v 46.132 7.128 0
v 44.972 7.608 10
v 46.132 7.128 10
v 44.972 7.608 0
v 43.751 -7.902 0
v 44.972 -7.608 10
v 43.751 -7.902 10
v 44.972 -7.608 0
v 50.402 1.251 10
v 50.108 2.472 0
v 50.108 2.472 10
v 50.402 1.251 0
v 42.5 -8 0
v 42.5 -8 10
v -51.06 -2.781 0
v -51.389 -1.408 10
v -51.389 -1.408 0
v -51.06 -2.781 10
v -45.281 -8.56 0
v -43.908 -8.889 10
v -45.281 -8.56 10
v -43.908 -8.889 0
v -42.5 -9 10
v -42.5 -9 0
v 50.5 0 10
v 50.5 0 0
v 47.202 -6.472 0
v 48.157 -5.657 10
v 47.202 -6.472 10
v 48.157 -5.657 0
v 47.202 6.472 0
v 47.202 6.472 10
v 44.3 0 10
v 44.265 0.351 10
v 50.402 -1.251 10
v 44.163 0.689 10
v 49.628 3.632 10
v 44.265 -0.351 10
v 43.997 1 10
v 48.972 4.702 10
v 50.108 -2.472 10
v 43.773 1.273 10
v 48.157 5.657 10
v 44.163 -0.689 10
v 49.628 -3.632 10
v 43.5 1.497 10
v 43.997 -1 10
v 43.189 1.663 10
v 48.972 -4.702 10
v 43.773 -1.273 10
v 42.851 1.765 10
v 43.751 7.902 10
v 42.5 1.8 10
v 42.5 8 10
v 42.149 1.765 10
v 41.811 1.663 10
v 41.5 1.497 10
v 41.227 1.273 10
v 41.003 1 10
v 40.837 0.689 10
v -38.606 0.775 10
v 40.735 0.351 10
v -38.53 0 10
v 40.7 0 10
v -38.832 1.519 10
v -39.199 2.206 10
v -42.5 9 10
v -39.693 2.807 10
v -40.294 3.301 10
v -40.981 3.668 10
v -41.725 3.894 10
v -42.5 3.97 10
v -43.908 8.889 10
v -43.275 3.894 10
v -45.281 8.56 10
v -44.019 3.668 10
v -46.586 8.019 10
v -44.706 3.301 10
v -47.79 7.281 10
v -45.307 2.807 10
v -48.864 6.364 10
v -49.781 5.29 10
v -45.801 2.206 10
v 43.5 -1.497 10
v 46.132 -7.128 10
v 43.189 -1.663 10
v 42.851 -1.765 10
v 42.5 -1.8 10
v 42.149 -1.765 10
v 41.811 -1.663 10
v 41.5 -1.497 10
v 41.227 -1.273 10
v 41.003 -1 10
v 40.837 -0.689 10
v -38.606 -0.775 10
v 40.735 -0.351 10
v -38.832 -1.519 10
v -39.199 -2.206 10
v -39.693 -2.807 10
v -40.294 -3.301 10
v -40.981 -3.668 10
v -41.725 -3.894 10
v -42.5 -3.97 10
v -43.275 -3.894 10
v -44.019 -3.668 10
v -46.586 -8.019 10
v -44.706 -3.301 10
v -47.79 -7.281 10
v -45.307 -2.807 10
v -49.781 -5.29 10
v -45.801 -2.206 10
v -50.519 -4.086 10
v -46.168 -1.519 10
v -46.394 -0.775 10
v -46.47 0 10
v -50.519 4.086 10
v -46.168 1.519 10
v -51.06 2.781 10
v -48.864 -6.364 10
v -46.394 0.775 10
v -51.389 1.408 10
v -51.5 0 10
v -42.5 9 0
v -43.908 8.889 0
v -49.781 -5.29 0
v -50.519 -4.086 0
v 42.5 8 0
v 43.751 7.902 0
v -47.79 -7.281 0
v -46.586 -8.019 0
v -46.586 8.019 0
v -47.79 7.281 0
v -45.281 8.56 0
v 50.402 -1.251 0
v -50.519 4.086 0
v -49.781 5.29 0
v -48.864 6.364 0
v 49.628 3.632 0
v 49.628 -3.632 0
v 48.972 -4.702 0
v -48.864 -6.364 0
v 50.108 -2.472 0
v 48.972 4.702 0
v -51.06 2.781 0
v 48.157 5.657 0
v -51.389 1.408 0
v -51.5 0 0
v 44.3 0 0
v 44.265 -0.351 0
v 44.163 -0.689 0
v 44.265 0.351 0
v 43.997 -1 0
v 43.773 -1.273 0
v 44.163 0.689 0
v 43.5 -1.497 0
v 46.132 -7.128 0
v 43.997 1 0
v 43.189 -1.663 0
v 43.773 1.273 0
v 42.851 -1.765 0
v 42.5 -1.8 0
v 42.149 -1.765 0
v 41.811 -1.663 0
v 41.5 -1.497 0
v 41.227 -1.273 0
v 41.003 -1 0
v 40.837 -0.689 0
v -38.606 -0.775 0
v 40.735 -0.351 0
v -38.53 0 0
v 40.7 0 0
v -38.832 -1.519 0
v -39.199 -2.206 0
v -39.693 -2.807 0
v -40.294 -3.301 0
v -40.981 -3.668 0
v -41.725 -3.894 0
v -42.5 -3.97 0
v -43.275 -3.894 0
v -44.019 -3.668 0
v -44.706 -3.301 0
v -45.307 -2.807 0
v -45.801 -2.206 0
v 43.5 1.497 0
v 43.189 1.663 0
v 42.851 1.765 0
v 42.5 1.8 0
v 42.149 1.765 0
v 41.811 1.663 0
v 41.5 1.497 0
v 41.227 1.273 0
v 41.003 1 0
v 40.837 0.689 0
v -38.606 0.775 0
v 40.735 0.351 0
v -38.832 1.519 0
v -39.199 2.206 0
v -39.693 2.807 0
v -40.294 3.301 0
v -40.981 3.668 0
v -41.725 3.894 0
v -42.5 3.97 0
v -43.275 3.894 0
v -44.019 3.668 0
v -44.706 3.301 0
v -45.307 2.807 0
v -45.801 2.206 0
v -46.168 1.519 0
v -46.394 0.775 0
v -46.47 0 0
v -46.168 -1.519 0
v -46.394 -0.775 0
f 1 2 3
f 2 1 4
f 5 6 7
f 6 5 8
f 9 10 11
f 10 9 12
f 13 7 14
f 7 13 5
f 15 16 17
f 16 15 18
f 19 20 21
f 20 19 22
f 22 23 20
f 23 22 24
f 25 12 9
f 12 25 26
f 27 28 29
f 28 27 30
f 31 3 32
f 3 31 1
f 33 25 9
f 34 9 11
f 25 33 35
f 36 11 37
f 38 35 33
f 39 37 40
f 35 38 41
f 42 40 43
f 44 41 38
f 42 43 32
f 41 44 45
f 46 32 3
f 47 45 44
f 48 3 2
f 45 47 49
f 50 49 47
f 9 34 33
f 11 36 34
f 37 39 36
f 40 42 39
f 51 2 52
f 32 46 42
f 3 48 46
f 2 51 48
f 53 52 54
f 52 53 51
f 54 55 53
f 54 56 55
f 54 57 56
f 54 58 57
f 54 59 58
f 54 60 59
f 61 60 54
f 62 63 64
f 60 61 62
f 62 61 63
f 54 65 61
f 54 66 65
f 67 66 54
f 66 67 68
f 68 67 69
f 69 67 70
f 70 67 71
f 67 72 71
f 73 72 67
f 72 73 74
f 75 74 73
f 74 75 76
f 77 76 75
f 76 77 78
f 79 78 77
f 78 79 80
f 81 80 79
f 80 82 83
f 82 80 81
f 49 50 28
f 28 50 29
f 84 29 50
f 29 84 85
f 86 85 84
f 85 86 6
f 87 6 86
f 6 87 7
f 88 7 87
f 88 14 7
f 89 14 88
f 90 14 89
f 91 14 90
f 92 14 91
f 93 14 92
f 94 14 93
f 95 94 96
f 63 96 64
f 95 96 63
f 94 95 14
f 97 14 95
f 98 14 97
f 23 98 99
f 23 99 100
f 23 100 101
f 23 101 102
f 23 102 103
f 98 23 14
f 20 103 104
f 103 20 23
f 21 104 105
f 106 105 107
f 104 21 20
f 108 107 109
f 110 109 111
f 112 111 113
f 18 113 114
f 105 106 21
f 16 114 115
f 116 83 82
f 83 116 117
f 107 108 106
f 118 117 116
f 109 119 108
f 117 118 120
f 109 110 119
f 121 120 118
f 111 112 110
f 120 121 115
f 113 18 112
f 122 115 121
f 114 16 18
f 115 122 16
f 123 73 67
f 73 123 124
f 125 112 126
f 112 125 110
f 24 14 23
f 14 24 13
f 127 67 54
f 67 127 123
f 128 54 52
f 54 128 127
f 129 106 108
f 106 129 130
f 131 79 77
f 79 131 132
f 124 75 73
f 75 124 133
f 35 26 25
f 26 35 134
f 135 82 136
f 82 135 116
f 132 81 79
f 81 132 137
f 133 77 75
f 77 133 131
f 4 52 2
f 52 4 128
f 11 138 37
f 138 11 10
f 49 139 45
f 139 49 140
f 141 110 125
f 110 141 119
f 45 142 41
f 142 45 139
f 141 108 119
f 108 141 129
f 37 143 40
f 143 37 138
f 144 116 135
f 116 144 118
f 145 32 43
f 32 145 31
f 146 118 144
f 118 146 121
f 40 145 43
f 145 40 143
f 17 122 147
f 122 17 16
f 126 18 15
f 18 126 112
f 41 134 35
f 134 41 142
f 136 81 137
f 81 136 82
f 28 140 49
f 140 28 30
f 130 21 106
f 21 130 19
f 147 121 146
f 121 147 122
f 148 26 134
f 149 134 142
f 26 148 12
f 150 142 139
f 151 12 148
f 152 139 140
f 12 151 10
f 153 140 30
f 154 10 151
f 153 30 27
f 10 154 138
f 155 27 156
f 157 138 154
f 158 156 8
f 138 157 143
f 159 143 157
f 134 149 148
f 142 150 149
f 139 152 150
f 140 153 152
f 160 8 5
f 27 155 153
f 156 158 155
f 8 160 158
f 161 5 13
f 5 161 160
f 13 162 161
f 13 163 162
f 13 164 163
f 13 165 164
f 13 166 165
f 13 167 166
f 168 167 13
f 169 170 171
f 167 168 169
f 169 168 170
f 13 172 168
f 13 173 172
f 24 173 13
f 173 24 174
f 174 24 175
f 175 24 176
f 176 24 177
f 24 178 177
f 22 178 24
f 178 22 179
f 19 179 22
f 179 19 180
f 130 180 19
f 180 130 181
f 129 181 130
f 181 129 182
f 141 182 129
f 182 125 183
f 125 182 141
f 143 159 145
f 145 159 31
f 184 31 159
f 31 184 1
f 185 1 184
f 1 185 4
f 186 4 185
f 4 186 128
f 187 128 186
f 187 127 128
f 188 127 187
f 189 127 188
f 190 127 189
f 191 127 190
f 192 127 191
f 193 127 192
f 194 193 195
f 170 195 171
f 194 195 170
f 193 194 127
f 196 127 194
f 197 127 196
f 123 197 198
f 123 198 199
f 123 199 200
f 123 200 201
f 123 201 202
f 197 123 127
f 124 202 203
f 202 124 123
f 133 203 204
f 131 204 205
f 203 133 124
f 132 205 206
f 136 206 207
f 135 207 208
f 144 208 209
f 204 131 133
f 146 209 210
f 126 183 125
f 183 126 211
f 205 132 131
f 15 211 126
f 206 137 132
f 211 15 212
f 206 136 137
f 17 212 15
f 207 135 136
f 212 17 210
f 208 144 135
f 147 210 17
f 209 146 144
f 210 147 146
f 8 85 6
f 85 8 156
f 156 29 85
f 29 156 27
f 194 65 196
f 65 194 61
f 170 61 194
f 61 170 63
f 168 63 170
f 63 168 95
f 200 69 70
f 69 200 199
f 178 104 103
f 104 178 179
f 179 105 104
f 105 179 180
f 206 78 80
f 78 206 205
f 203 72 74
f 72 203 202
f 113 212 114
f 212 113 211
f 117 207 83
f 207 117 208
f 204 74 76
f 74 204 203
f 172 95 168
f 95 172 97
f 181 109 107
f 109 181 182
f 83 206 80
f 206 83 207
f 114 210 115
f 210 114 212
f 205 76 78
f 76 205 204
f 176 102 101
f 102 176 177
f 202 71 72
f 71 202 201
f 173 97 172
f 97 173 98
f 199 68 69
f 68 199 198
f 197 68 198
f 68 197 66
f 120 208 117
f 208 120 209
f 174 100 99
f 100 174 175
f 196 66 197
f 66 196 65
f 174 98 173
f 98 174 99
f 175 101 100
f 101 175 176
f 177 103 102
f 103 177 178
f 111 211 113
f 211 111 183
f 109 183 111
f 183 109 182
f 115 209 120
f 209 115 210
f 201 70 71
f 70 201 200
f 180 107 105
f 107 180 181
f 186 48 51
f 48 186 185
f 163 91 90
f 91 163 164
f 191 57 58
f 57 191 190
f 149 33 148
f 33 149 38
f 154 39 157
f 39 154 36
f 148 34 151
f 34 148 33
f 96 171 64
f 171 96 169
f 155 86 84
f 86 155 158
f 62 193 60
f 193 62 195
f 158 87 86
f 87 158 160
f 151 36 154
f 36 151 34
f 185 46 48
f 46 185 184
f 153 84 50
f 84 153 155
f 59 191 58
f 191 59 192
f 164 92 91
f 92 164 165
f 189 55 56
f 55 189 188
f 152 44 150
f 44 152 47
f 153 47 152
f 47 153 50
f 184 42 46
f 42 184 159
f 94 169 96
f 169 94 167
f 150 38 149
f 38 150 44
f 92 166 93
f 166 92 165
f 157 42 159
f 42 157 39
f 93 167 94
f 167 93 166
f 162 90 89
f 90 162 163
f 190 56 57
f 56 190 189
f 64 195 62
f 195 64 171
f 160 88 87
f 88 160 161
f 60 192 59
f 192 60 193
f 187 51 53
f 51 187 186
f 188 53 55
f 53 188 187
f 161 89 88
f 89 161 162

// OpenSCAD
$fn = 32;

// ----------------------------------------------------------------------
// Lever: 85 mm between the bosses, 10 mm thick, smooth outline
// ----------------------------------------------------------------------

// --- parameters (mm) ---
lever_l = 85;             // distance between the boss centres
boss_a = 18;              // first boss diameter
boss_b = 16;              // second boss diameter
bore_a = 7.94;            // first bore
bore_b = 3.6;             // second bore
lever_t = 10;             // lever thickness

lever_profile = [[-51.5, 0], [-51.389, -1.408], [-51.06, -2.781], [-50.519, -4.086], [-49.781, -5.29], [-48.864, -6.364], [-47.79, -7.281], [-46.586, -8.019], [-45.281, -8.56], [-43.908, -8.889], [-42.5, -9], [42.5, -8], [43.751, -7.902], [44.972, -7.608], [46.132, -7.128], [47.202, -6.472], [48.157, -5.657], [48.972, -4.702], [49.628, -3.632], [50.108, -2.472], [50.402, -1.251], [50.5, 0], [50.402, 1.251], [50.108, 2.472], [49.628, 3.632], [48.972, 4.702], [48.157, 5.657], [47.202, 6.472], [46.132, 7.128], [44.972, 7.608], [43.751, 7.902], [42.5, 8], [-42.5, 9], [-43.908, 8.889], [-45.281, 8.56], [-46.586, 8.019], [-47.79, 7.281], [-48.864, 6.364], [-49.781, 5.29], [-50.519, 4.086], [-51.06, 2.781], [-51.389, 1.408]];

difference() {
  linear_extrude(height = lever_t) polygon(lever_profile);
  translate([-42.5, 0, -2.5]) cylinder(h = lever_t + 5, d = bore_a);
  translate([42.5, 0, -2.5]) cylinder(h = lever_t + 5, d = bore_b);
}
